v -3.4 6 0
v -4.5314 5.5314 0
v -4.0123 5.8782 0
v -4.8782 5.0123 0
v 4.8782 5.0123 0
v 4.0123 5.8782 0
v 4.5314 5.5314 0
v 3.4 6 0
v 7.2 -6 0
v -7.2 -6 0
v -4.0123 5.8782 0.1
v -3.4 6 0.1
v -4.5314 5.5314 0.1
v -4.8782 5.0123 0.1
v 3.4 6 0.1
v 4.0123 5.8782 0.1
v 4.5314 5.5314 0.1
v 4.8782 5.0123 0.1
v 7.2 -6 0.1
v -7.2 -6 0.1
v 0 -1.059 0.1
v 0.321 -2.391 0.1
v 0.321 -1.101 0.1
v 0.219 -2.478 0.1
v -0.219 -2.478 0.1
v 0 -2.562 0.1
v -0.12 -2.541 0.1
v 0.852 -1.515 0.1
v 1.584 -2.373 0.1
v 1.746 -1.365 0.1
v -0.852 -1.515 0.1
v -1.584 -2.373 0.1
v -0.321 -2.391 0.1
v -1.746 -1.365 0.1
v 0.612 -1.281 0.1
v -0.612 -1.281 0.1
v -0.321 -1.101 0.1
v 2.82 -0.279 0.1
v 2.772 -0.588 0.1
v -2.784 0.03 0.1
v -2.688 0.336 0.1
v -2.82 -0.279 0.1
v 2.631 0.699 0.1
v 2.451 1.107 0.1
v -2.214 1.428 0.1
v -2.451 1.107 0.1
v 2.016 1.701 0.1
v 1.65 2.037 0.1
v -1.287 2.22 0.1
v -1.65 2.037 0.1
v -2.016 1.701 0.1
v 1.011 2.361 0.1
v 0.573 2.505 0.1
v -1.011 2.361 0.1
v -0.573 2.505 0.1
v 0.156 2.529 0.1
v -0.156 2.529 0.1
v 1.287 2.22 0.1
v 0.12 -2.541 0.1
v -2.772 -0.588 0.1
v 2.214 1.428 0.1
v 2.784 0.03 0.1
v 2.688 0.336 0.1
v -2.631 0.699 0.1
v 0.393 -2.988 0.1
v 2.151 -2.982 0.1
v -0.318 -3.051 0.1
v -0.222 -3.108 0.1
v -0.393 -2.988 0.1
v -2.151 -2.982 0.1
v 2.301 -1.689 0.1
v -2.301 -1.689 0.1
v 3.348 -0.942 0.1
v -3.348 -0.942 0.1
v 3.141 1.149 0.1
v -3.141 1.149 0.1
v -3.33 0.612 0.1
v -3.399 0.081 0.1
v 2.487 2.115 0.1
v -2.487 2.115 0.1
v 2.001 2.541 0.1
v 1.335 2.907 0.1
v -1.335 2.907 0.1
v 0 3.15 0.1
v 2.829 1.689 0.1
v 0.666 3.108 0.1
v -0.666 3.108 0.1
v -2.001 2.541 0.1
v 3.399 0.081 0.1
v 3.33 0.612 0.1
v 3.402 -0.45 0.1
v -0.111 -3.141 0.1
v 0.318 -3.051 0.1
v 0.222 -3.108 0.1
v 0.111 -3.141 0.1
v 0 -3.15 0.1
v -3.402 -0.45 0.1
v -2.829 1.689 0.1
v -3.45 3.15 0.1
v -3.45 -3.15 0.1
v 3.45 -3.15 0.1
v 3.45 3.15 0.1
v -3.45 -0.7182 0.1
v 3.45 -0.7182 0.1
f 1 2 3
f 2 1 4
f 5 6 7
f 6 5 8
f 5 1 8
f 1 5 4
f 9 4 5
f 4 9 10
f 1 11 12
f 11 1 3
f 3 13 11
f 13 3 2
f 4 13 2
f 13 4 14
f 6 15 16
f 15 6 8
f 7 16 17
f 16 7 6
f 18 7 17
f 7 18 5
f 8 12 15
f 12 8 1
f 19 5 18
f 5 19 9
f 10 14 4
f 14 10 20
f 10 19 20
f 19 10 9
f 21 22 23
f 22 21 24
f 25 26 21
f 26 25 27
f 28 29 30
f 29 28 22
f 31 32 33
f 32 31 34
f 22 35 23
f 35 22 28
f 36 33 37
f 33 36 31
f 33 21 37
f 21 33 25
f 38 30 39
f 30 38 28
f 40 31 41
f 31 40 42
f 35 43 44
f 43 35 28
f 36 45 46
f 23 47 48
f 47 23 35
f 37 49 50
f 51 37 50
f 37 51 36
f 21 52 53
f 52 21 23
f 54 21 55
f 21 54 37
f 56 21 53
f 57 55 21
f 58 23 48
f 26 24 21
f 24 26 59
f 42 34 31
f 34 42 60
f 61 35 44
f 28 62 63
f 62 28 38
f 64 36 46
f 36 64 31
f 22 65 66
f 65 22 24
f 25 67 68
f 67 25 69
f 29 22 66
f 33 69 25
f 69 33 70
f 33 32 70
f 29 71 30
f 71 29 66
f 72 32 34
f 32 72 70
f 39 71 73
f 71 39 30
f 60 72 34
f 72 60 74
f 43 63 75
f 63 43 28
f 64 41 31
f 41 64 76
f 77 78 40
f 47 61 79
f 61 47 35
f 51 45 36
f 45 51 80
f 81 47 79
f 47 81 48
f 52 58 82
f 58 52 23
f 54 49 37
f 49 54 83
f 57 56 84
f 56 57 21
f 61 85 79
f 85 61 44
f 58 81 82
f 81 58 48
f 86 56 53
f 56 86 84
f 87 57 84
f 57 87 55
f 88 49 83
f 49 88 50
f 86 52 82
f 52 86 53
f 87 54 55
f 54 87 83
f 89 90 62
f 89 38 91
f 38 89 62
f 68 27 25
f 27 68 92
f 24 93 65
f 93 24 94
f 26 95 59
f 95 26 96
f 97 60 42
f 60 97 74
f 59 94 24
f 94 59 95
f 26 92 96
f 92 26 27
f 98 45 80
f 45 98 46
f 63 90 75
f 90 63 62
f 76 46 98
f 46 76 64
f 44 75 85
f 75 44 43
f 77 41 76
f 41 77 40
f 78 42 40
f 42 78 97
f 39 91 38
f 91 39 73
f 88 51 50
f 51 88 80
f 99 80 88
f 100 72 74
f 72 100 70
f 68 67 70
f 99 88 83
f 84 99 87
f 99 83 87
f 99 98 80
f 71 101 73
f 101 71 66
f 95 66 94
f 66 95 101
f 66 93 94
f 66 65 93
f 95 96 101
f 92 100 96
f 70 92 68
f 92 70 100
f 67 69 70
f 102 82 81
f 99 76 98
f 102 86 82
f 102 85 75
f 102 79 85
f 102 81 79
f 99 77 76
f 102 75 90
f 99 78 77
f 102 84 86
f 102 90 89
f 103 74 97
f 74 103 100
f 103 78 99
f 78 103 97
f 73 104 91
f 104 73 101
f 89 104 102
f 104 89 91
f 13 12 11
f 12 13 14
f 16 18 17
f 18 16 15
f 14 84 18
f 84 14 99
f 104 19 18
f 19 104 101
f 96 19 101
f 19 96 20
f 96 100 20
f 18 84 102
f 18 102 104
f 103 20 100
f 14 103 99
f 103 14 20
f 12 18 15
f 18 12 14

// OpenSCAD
// file: ../p/3-16cyli.scad
use <../lib.scad>
function ldraw_lib__3_16cyli() = [
// 0 Cylinder 0.1875
// 0 Name: 3-16cyli.dat
// 0 Author: Mark Kennedy [mkennedy]
// 0 !LDRAW_ORG Primitive UPDATE 2005-01
// 0 !LICENSE Licensed under CC BY 2.0 and CC BY 4.0 : see CAreadme.txt
// 
// 0 BFC CERTIFY CCW
  [0,"BFC","CERTIFY"],
  [0,"BFC","CCW"],
// 
// 0 !HISTORY 2004-03-02 [PTadmin] Official Update 2004-01
// 0 !HISTORY 2004-12-11 [nielsk] Recreated using Primitive Generator, Edge lines fixed, BFC changed to CCW
// 0 !HISTORY 2005-12-28 [PTadmin] Official Update 2005-01
// 0 !HISTORY 2007-06-24 [PTadmin] Header formatted for Contributor Agreement
// 0 !HISTORY 2008-07-01 [PTadmin] Official Update 2008-01
// 
// 
// 4 16 .9239 1 .3827 .9239 0 .3827 1 0 0 1 1 0
  [4,16,.9239,1,.3827,.9239,0,.3827,1,0,0,1,1,0],
// 4 16 .7071 1 .7071 .7071 0 .7071 .9239 0 .3827 .9239 1 .3827
  [4,16,.7071,1,.7071,.7071,0,.7071,.9239,0,.3827,.9239,1,.3827],
// 4 16 .3827 1 .9239 .3827 0 .9239 .7071 0 .7071 .7071 1 .7071
  [4,16,.3827,1,.9239,.3827,0,.9239,.7071,0,.7071,.7071,1,.7071],
// 5 24 1 1 0 1 0 0 1 1 -.4142 .9239 1 .3827
  [5,24,1,1,0,1,0,0,1,1,-.4142,.9239,1,.3827],
// 5 24 .9239 1 .3827 .9239 0 .3827 1 1 0 .7071 1 .7071
  [5,24,.9239,1,.3827,.9239,0,.3827,1,1,0,.7071,1,.7071],
// 5 24 .7071 1 .7071 .7071 0 .7071 .9239 1 .3827 .3827 1 .9239
  [5,24,.7071,1,.7071,.7071,0,.7071,.9239,1,.3827,.3827,1,.9239],
// 5 24 .3827 1 .9239 .3827 0 .9239 .7071 1 .7071 0 1 1.0824
  [5,24,.3827,1,.9239,.3827,0,.9239,.7071,1,.7071,0,1,1.0824],
// 0
];
makepoly(ldraw_lib__3_16cyli(), line=0.2);
// file: ../p/3-16chrd.scad
use <../lib.scad>
function ldraw_lib__3_16chrd() = [
// 0 Chord 0.1875
// 0 Name: 3-16chrd.dat
// 0 Author: Niels Karsdorp [nielsk]
// 0 !LDRAW_ORG Primitive UPDATE 2009-01
// 0 !LICENSE Licensed under CC BY 2.0 and CC BY 4.0 : see CAreadme.txt
// 
// 0 BFC CERTIFY CCW
  [0,"BFC","CERTIFY"],
  [0,"BFC","CCW"],
// 
// 0 !HISTORY 2009-05-02 [PTadmin] Official Update 2009-01
// 
// 
// 4 16 1 0 0 0.9239 0 0.3827 0.7071 0 0.7071 0.3827 0 0.9239
  [4,16,1,0,0,0.9239,0,0.3827,0.7071,0,0.7071,0.3827,0,0.9239],
// 0
// 
];
makepoly(ldraw_lib__3_16chrd(), line=0.2);
// main file
use <../lib.scad>
use <../p/3-16chrd.scad>
use <../p/3-16cyli.scad>
use <s/3004s60.scad>
function ldraw_lib__004695c() = [
// 0 Sticker Minifig Torso with Shell Logo 1971
// 0 Name: 004695c.dat
// 0 Author: J.C. Tchang [tchang]
// 0 !LDRAW_ORG Part UPDATE 2019-01
// 0 !LICENSE Licensed under CC BY 2.0 and CC BY 4.0 : see CAreadme.txt
// 
// 0 BFC CERTIFY CCW
  [0,"BFC","CERTIFY"],
  [0,"BFC","CCW"],
// 
// 0 !KEYWORDS Set 377
// 
// 0 !HISTORY 2014-06-21 [PTadmin] Official Update 2014-01
// 0 !HISTORY 2017-07-02 [cwdee] Use cylinder primitives with conditional lines
// 0 !HISTORY 2019-04-01 [MMR1988] Added missing condlines
// 0 !HISTORY 2019-06-28 [PTadmin] Official Update 2019-01
// 
// 
// 1 16 -8.5 0 11 0 0 -4 0 -1 0 4 0 0 3-16chrd.dat
  [1,16,-8.5,0,11,0,0,-4,0,-1,0,4,0,0, ldraw_lib__3_16chrd()],
// 1 16 8.5 0 11 0 0 4 0 -1 0 4 0 0 3-16chrd.dat
  [1,16,8.5,0,11,0,0,4,0,-1,0,4,0,0, ldraw_lib__3_16chrd()],
// 4 16 -12.1956 0 12.5308 -8.5 0 15 8.5 0 15 12.1956 0 12.5308
  [4,16,-12.1956,0,12.5308,-8.5,0,15,8.5,0,15,12.1956,0,12.5308],
// 4 16 12.1956 0 12.5308 18 0 -15 -18 0 -15 -12.1956 0 12.5308
  [4,16,12.1956,0,12.5308,18,0,-15,-18,0,-15,-12.1956,0,12.5308],
// 1 16 -8.5 0 11 0 0 -4 0 -0.25 0 4 0 0 3-16cyli.dat
  [1,16,-8.5,0,11,0,0,-4,0,-0.25,0,4,0,0, ldraw_lib__3_16cyli()],
// 1 16 8.5 0 11 0 0 4 0 -0.25 0 4 0 0 3-16cyli.dat
  [1,16,8.5,0,11,0,0,4,0,-0.25,0,4,0,0, ldraw_lib__3_16cyli()],
// 4 16 8.5 0 15 -8.5 0 15 -8.5 -0.25 15 8.5 -0.25 15
  [4,16,8.5,0,15,-8.5,0,15,-8.5,-0.25,15,8.5,-0.25,15],
// 4 16 12.1956 -0.25 12.5308 18 -0.25 -15 18 0 -15 12.1956 0 12.5308
  [4,16,12.1956,-0.25,12.5308,18,-0.25,-15,18,0,-15,12.1956,0,12.5308],
// 4 16 -12.1956 0 12.5308 -18 0 -15 -18 -0.25 -15 -12.1956 -0.25 12.5308
  [4,16,-12.1956,0,12.5308,-18,0,-15,-18,-0.25,-15,-12.1956,-0.25,12.5308],
// 4 16 18 -0.25 -15 -18 -0.25 -15 -18 0 -15 18 0 -15
  [4,16,18,-0.25,-15,-18,-0.25,-15,-18,0,-15,18,0,-15],
// 
// 1 15 0 -0.25 0 0.75 0 0 0 0 1 0 -0.75 0 s\3004s60.dat
  [1,15,0,-0.25,0,0.75,0,0,0,0,1,0,-0.75,0, ldraw_lib__s__3004s60()],
// 
// 1 15 -8.5 -0.25 11 0 0 -4 0 1 0 4 0 0 3-16chrd.dat
  [1,15,-8.5,-0.25,11,0,0,-4,0,1,0,4,0,0, ldraw_lib__3_16chrd()],
// 1 15 8.5 -0.25 11 0 0 4 0 1 0 4 0 0 3-16chrd.dat
  [1,15,8.5,-0.25,11,0,0,4,0,1,0,4,0,0, ldraw_lib__3_16chrd()],
// 4 15 12.1956 -0.25 12.5308 -12.1956 -0.25 12.5308 -8.625 -0.25 7.875 0 -0.25 7.875
  [4,15,12.1956,-0.25,12.5308,-12.1956,-0.25,12.5308,-8.625,-0.25,7.875,0,-0.25,7.875],
// 4 15 8.625 -0.25 -7.875 18 -0.25 -15 12.1956 -0.25 12.5308 8.625 -0.25 -1.7955
  [4,15,8.625,-0.25,-7.875,18,-0.25,-15,12.1956,-0.25,12.5308,8.625,-0.25,-1.7955],
// 4 15 18 -0.25 -15 8.625 -0.25 -7.875 0 -0.25 -7.875 -18 -0.25 -15
  [4,15,18,-0.25,-15,8.625,-0.25,-7.875,0,-0.25,-7.875,-18,-0.25,-15],
// 3 15 0 -0.25 -7.875 -8.625 -0.25 -7.875 -18 -0.25 -15
  [3,15,0,-0.25,-7.875,-8.625,-0.25,-7.875,-18,-0.25,-15],
// 3 15 12.1956 -0.25 12.5308 0 -0.25 7.875 8.625 -0.25 7.875
  [3,15,12.1956,-0.25,12.5308,0,-0.25,7.875,8.625,-0.25,7.875],
// 3 15 12.1956 -0.25 12.5308 8.625 -0.25 7.875 8.625 -0.25 -1.7955
  [3,15,12.1956,-0.25,12.5308,8.625,-0.25,7.875,8.625,-0.25,-1.7955],
// 3 15 -8.625 -0.25 -1.7955 -18 -0.25 -15 -8.625 -0.25 -7.875
  [3,15,-8.625,-0.25,-1.7955,-18,-0.25,-15,-8.625,-0.25,-7.875],
// 4 15 -18 -0.25 -15 -8.625 -0.25 -1.7955 -8.625 -0.25 7.875 -12.1956 -0.25 12.5308
  [4,15,-18,-0.25,-15,-8.625,-0.25,-1.7955,-8.625,-0.25,7.875,-12.1956,-0.25,12.5308],
// 4 15 -8.5 -0.25 15 -12.1956 -0.25 12.5308 12.1956 -0.25 12.5308 8.5 -0.25 15
  [4,15,-8.5,-0.25,15,-12.1956,-0.25,12.5308,12.1956,-0.25,12.5308,8.5,-0.25,15],
// 
// 5 24 12.1956 0 12.5308 12.1956 -0.25 12.5308 18 -0.25 -15 11.3284 0 13.8284
  [5,24,12.1956,0,12.5308,12.1956,-0.25,12.5308,18,-0.25,-15,11.3284,0,13.8284],
// 5 24 -12.1956 -0.25 12.5308 -12.1956 0 12.5308 -18 0 -15 -11.3284 0 13.8284
  [5,24,-12.1956,-0.25,12.5308,-12.1956,0,12.5308,-18,0,-15,-11.3284,0,13.8284],
];
makepoly(ldraw_lib__004695c(), line=0.2);
